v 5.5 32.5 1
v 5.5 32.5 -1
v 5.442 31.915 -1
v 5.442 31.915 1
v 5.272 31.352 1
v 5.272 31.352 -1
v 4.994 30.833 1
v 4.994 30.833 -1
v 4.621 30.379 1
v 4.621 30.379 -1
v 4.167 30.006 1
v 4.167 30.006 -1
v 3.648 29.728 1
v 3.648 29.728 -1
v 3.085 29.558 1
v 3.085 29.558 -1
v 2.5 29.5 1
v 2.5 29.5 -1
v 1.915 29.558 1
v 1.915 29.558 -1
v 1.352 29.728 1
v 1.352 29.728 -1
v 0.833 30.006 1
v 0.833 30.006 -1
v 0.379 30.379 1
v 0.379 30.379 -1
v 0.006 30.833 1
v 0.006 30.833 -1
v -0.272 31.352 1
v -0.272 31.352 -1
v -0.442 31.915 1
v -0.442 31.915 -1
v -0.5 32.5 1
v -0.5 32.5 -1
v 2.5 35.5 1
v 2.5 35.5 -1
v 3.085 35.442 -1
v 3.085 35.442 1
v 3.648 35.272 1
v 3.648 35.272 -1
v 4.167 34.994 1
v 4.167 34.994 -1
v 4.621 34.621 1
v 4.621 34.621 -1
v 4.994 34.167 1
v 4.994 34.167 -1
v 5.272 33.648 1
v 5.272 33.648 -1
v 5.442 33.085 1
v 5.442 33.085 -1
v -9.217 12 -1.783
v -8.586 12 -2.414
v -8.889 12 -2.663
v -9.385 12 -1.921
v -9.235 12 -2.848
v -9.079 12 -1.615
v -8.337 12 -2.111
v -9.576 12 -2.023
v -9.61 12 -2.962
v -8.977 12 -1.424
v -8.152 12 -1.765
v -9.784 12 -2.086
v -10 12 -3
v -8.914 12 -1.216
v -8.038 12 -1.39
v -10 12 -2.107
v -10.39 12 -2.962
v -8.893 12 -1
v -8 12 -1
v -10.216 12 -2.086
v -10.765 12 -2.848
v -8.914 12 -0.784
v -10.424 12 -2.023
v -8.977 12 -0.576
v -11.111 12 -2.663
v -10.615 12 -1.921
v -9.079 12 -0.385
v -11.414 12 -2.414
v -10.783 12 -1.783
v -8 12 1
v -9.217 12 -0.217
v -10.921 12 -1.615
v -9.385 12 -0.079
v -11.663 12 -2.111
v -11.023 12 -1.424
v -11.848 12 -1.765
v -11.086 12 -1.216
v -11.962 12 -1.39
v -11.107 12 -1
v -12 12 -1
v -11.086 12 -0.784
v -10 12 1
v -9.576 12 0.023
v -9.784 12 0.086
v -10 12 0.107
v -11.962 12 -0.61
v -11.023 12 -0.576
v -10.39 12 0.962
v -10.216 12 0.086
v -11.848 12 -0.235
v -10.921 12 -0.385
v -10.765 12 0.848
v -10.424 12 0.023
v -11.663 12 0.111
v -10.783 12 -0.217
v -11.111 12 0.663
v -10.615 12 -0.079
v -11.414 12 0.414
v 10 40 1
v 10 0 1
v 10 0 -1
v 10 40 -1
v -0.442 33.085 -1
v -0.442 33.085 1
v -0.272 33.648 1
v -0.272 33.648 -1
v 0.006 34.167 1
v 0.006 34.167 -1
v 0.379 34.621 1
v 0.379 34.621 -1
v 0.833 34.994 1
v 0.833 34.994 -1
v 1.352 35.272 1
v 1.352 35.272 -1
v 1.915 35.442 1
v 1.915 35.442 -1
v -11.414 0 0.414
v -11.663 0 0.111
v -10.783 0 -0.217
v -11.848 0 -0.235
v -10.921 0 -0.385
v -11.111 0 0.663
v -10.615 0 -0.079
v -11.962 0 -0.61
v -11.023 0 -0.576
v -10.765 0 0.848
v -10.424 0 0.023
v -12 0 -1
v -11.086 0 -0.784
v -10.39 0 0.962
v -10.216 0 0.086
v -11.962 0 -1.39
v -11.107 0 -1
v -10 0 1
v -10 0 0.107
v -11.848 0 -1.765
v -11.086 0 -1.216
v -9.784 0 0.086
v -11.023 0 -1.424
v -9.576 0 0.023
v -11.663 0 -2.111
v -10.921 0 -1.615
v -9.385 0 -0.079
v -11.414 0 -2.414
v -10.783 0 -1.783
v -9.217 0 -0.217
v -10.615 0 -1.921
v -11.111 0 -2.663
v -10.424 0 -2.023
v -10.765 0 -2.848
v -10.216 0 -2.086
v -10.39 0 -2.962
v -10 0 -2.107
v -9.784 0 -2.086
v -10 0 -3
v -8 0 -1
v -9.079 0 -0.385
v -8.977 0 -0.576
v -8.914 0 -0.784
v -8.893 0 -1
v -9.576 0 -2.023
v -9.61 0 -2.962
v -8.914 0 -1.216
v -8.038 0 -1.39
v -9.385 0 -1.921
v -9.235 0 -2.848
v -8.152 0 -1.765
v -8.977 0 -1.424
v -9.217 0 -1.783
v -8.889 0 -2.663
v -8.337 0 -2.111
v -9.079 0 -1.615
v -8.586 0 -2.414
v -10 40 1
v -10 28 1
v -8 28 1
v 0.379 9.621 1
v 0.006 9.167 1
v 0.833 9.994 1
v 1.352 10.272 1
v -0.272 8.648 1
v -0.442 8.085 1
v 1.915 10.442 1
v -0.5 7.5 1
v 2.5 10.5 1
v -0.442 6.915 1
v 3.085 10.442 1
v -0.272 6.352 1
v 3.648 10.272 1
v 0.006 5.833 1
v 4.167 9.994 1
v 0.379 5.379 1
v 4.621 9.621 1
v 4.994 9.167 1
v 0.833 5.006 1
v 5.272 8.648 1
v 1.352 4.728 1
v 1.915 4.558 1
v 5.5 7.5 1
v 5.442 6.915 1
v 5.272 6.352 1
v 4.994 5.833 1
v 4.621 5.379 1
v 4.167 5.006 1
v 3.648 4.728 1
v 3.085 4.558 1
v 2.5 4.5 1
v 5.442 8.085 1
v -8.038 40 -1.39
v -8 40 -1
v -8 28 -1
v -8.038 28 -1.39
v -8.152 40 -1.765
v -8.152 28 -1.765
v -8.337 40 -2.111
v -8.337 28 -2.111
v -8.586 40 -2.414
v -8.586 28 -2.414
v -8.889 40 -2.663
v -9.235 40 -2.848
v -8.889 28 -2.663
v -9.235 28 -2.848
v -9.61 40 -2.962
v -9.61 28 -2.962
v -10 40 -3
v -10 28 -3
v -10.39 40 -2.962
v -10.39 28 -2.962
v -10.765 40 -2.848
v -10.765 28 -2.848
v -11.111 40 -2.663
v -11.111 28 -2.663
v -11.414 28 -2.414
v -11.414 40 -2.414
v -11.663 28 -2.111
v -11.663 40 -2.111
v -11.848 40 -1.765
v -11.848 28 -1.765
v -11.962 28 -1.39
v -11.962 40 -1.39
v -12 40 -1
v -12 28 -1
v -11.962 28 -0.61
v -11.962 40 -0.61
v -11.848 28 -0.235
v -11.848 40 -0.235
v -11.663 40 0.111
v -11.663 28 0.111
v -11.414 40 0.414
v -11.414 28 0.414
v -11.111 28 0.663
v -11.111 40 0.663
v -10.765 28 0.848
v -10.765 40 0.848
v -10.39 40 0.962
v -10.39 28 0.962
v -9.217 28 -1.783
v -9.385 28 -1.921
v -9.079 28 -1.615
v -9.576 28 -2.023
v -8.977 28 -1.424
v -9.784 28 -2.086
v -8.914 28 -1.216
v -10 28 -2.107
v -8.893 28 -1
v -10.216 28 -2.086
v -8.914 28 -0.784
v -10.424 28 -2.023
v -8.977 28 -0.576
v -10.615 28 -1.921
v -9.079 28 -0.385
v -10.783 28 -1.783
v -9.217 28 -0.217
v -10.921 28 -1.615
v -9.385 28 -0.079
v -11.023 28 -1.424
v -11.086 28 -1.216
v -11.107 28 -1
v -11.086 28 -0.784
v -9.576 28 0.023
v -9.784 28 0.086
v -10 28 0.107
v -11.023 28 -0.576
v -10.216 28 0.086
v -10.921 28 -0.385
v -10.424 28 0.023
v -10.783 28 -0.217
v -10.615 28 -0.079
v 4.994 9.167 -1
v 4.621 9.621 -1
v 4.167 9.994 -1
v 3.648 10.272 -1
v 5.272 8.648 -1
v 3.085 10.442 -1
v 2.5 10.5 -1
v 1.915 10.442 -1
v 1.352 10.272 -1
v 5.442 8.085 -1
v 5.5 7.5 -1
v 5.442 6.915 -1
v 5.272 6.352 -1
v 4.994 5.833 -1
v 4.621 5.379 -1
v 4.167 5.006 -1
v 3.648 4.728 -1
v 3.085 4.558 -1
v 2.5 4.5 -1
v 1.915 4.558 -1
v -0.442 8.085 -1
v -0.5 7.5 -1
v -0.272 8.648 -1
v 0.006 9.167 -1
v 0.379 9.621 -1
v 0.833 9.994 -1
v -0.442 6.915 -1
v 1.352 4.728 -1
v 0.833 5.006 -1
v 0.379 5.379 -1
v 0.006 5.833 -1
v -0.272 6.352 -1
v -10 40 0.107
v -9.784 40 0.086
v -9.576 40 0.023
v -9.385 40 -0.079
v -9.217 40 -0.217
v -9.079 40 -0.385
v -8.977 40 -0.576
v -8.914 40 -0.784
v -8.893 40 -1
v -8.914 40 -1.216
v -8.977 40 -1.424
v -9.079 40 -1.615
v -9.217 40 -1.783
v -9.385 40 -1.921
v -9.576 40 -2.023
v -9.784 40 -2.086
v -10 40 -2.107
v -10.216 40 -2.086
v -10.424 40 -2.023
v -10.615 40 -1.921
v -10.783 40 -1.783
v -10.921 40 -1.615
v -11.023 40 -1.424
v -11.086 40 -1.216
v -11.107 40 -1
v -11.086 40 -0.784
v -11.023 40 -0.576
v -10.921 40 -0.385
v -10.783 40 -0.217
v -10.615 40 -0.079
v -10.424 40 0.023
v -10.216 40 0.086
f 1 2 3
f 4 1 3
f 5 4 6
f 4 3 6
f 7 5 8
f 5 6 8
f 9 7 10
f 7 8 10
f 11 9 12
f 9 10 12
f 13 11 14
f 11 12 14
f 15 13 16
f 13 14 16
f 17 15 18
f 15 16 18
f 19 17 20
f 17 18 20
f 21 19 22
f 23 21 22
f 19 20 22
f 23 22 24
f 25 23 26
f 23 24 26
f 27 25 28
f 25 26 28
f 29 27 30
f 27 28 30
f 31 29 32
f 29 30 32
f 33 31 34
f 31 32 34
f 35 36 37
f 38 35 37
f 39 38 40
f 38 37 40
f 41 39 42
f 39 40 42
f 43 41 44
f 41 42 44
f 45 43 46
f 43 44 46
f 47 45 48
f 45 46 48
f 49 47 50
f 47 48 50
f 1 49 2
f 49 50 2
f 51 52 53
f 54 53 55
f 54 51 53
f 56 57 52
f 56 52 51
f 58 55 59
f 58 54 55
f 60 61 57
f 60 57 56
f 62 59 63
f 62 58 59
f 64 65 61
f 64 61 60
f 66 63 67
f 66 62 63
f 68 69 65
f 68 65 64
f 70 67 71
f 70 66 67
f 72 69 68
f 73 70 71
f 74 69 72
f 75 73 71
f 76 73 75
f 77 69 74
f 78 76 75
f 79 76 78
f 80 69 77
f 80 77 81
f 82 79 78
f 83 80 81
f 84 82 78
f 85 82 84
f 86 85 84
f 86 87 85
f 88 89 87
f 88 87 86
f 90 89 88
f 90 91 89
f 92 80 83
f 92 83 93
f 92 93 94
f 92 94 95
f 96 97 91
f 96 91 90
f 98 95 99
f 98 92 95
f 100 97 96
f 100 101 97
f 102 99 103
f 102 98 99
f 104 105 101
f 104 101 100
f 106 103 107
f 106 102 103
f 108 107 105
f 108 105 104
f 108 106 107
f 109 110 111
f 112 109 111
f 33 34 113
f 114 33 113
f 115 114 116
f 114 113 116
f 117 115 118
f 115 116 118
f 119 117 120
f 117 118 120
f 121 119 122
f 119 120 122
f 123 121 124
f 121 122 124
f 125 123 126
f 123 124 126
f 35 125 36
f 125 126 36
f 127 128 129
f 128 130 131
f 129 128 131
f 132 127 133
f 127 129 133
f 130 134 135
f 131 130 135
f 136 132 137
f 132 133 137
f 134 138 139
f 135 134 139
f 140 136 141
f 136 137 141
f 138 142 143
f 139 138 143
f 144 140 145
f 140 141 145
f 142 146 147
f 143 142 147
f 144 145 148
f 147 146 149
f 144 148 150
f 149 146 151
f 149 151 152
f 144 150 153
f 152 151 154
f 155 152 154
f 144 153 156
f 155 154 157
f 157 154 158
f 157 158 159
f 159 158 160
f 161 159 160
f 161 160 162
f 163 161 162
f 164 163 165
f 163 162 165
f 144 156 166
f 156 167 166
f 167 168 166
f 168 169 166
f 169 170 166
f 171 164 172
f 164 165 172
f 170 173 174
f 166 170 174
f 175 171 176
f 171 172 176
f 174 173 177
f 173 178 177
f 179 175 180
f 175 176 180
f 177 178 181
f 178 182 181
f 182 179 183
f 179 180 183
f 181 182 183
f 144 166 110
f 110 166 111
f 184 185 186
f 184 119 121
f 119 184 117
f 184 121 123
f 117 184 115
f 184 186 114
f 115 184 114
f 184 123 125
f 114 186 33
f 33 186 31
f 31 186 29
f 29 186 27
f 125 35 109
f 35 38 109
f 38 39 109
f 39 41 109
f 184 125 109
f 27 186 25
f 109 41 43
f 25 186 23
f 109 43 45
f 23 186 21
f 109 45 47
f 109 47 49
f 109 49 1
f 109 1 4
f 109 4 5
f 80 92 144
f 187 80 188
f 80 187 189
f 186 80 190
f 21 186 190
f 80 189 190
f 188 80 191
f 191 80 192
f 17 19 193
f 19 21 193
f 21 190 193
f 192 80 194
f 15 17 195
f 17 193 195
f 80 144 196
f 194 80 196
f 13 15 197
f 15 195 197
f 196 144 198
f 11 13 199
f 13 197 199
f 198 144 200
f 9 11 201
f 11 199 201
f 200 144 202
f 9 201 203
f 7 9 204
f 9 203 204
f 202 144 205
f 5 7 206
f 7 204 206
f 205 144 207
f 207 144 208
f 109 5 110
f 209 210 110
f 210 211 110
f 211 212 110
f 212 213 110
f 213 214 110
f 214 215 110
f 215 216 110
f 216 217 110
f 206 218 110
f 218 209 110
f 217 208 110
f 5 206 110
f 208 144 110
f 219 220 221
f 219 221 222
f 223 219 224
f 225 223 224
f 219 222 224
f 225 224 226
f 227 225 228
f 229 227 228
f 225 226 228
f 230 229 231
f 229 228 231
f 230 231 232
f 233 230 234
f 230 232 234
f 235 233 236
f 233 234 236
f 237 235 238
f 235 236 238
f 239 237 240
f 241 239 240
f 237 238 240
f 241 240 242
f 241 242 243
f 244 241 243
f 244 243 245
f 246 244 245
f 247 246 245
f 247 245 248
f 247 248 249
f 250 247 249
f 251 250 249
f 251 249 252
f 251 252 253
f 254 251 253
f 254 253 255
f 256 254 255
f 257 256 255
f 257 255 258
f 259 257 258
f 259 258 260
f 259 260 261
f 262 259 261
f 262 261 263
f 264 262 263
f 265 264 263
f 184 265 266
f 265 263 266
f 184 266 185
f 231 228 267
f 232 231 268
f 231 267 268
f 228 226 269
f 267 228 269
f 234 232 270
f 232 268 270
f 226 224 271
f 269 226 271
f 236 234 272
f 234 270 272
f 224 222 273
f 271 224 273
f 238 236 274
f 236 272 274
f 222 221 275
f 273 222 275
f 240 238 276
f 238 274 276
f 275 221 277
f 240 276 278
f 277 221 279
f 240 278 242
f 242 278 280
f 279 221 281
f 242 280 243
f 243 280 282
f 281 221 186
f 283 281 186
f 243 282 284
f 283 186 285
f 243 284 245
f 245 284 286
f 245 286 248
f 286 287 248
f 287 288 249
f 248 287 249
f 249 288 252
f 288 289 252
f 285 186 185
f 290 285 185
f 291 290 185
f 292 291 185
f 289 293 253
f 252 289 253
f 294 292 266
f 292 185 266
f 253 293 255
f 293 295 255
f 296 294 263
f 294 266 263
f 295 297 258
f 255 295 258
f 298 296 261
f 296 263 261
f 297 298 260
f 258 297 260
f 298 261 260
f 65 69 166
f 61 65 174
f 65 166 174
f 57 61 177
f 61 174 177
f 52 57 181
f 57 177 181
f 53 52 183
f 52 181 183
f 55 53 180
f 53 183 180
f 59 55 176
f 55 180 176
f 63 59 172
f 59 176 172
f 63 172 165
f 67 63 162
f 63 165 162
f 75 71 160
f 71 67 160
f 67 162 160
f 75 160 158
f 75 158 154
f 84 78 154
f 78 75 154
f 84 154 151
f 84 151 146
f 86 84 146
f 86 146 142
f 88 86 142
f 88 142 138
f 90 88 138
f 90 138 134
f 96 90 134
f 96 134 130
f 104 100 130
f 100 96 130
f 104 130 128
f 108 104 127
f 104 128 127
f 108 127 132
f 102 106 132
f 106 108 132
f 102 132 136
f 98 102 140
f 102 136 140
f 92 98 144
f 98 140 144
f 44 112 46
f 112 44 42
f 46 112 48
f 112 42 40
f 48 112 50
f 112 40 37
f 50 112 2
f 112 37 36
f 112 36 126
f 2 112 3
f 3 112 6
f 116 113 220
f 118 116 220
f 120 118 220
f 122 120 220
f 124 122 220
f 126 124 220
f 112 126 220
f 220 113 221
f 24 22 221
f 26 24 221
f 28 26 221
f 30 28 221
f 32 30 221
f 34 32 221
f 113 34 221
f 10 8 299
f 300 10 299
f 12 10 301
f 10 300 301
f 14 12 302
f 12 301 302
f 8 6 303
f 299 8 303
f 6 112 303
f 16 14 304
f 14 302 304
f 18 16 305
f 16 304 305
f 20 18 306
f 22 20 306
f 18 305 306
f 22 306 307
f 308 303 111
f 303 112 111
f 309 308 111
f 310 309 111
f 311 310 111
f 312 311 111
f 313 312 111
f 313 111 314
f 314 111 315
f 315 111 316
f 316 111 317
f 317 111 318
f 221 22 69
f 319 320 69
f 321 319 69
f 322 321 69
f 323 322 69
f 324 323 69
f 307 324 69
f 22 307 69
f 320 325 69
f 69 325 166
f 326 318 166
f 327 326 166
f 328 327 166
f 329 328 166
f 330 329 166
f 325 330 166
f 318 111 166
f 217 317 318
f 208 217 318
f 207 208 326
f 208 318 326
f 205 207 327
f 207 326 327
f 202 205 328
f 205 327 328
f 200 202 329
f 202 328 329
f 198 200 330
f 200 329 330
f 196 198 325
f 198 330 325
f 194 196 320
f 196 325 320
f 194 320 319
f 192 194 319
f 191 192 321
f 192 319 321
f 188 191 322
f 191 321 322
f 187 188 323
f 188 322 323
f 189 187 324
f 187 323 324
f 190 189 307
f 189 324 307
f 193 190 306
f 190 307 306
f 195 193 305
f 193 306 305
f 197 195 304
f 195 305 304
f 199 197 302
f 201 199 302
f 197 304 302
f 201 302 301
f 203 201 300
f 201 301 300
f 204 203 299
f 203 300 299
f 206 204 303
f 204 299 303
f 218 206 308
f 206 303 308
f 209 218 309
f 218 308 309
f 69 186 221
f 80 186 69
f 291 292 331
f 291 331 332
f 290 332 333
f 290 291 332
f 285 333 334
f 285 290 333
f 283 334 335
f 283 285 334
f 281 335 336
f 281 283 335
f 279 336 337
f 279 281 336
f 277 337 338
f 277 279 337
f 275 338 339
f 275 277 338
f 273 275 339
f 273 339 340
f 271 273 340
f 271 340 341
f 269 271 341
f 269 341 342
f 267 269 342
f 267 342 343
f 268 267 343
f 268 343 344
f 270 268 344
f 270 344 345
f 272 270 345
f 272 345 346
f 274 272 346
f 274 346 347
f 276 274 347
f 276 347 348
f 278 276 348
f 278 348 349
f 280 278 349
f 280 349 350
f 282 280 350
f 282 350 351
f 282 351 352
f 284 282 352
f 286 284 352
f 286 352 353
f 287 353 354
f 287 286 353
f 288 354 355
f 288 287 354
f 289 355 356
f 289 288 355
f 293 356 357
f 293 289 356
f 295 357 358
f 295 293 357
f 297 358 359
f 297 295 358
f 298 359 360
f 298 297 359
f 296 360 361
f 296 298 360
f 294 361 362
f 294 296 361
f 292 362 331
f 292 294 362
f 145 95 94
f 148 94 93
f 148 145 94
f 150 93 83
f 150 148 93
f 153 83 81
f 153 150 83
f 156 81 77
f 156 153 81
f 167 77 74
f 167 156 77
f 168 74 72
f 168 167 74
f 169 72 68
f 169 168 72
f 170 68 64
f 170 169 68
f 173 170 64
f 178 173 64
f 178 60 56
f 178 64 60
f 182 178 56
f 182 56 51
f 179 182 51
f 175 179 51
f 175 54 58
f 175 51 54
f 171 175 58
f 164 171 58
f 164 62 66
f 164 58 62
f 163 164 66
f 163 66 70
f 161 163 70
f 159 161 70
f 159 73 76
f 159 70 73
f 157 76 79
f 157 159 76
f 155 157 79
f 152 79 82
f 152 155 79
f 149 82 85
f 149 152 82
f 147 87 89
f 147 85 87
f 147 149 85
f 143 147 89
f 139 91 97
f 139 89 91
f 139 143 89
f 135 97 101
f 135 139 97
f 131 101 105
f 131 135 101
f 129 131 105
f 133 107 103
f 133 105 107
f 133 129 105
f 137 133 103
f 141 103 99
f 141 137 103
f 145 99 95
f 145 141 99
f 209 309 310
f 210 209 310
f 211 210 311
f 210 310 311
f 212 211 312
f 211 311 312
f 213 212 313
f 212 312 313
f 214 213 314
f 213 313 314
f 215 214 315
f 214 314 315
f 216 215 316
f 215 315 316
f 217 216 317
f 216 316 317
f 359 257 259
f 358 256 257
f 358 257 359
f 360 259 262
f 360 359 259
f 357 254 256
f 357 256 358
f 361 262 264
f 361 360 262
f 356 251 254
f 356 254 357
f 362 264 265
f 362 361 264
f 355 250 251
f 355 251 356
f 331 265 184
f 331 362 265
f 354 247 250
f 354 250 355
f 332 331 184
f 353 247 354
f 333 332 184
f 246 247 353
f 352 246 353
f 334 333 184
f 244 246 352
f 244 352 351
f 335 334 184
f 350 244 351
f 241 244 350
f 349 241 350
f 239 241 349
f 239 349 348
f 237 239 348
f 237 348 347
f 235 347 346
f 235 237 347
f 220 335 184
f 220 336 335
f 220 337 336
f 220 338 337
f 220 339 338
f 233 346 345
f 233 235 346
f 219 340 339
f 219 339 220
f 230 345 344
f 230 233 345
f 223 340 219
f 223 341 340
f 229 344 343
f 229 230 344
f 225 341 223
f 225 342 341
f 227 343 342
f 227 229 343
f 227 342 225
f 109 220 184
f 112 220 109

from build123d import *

# Parameters (mm, degrees)
SKETCH_1_R               = 1.107438874
EXTRUDE_1_DEPTH          = 40
CUT_EXTRUDE_1_DEPTH      = 40
CUT_EXTRUDE_1_DEPTH_BACK = 40
SKETCH_3_W               = 4
SKETCH_3_H               = 16
SKETCH_5_R               = 3
CUT_EXTRUDE_2_DEPTH      = 10


with BuildPart() as part:
    # 草图1 → 凸台-拉伸1 (new body)
    with BuildSketch(Plane(origin=(0, 0, 0), x_dir=(1, 0, 0), z_dir=(0, 1, 0))):
        with BuildLine():
            ThreePointArc((-8, 1), (-11.414213562, 2.414213562), (-10, -1))
            Line((-10, -1), (10, -1))
            Line((10, -1), (10, 1))
            Line((10, 1), (-8, 1))
        make_face()
        with Locations((-10, 1)):
            Circle(SKETCH_1_R, mode=Mode.SUBTRACT)
    extrude(amount=EXTRUDE_1_DEPTH)

    # 草图3 → 切除-拉伸1 (cut, two sides: drawn at the far end of the back side and taken through both)
    with BuildSketch(Plane(origin=(0, 0, -1), x_dir=(-1, 0, 0), z_dir=(0, 0, -1)).offset(-CUT_EXTRUDE_1_DEPTH_BACK)):
        with Locations((10, 20)):
            Rectangle(SKETCH_3_W, SKETCH_3_H)
    extrude(amount=CUT_EXTRUDE_1_DEPTH + CUT_EXTRUDE_1_DEPTH_BACK, mode=Mode.SUBTRACT)

    # 草图5 → 切除-拉伸2 (cut)
    with BuildSketch(Plane(origin=(0, 0, -1), x_dir=(-1, 0, 0), z_dir=(0, 0, -1))):
        with Locations((-2.5, 7.5)):
            Circle(SKETCH_5_R)
        with Locations((-2.5, 32.5)):
            Circle(SKETCH_5_R)
    extrude(amount=-CUT_EXTRUDE_2_DEPTH, mode=Mode.SUBTRACT)


solid = part.part
